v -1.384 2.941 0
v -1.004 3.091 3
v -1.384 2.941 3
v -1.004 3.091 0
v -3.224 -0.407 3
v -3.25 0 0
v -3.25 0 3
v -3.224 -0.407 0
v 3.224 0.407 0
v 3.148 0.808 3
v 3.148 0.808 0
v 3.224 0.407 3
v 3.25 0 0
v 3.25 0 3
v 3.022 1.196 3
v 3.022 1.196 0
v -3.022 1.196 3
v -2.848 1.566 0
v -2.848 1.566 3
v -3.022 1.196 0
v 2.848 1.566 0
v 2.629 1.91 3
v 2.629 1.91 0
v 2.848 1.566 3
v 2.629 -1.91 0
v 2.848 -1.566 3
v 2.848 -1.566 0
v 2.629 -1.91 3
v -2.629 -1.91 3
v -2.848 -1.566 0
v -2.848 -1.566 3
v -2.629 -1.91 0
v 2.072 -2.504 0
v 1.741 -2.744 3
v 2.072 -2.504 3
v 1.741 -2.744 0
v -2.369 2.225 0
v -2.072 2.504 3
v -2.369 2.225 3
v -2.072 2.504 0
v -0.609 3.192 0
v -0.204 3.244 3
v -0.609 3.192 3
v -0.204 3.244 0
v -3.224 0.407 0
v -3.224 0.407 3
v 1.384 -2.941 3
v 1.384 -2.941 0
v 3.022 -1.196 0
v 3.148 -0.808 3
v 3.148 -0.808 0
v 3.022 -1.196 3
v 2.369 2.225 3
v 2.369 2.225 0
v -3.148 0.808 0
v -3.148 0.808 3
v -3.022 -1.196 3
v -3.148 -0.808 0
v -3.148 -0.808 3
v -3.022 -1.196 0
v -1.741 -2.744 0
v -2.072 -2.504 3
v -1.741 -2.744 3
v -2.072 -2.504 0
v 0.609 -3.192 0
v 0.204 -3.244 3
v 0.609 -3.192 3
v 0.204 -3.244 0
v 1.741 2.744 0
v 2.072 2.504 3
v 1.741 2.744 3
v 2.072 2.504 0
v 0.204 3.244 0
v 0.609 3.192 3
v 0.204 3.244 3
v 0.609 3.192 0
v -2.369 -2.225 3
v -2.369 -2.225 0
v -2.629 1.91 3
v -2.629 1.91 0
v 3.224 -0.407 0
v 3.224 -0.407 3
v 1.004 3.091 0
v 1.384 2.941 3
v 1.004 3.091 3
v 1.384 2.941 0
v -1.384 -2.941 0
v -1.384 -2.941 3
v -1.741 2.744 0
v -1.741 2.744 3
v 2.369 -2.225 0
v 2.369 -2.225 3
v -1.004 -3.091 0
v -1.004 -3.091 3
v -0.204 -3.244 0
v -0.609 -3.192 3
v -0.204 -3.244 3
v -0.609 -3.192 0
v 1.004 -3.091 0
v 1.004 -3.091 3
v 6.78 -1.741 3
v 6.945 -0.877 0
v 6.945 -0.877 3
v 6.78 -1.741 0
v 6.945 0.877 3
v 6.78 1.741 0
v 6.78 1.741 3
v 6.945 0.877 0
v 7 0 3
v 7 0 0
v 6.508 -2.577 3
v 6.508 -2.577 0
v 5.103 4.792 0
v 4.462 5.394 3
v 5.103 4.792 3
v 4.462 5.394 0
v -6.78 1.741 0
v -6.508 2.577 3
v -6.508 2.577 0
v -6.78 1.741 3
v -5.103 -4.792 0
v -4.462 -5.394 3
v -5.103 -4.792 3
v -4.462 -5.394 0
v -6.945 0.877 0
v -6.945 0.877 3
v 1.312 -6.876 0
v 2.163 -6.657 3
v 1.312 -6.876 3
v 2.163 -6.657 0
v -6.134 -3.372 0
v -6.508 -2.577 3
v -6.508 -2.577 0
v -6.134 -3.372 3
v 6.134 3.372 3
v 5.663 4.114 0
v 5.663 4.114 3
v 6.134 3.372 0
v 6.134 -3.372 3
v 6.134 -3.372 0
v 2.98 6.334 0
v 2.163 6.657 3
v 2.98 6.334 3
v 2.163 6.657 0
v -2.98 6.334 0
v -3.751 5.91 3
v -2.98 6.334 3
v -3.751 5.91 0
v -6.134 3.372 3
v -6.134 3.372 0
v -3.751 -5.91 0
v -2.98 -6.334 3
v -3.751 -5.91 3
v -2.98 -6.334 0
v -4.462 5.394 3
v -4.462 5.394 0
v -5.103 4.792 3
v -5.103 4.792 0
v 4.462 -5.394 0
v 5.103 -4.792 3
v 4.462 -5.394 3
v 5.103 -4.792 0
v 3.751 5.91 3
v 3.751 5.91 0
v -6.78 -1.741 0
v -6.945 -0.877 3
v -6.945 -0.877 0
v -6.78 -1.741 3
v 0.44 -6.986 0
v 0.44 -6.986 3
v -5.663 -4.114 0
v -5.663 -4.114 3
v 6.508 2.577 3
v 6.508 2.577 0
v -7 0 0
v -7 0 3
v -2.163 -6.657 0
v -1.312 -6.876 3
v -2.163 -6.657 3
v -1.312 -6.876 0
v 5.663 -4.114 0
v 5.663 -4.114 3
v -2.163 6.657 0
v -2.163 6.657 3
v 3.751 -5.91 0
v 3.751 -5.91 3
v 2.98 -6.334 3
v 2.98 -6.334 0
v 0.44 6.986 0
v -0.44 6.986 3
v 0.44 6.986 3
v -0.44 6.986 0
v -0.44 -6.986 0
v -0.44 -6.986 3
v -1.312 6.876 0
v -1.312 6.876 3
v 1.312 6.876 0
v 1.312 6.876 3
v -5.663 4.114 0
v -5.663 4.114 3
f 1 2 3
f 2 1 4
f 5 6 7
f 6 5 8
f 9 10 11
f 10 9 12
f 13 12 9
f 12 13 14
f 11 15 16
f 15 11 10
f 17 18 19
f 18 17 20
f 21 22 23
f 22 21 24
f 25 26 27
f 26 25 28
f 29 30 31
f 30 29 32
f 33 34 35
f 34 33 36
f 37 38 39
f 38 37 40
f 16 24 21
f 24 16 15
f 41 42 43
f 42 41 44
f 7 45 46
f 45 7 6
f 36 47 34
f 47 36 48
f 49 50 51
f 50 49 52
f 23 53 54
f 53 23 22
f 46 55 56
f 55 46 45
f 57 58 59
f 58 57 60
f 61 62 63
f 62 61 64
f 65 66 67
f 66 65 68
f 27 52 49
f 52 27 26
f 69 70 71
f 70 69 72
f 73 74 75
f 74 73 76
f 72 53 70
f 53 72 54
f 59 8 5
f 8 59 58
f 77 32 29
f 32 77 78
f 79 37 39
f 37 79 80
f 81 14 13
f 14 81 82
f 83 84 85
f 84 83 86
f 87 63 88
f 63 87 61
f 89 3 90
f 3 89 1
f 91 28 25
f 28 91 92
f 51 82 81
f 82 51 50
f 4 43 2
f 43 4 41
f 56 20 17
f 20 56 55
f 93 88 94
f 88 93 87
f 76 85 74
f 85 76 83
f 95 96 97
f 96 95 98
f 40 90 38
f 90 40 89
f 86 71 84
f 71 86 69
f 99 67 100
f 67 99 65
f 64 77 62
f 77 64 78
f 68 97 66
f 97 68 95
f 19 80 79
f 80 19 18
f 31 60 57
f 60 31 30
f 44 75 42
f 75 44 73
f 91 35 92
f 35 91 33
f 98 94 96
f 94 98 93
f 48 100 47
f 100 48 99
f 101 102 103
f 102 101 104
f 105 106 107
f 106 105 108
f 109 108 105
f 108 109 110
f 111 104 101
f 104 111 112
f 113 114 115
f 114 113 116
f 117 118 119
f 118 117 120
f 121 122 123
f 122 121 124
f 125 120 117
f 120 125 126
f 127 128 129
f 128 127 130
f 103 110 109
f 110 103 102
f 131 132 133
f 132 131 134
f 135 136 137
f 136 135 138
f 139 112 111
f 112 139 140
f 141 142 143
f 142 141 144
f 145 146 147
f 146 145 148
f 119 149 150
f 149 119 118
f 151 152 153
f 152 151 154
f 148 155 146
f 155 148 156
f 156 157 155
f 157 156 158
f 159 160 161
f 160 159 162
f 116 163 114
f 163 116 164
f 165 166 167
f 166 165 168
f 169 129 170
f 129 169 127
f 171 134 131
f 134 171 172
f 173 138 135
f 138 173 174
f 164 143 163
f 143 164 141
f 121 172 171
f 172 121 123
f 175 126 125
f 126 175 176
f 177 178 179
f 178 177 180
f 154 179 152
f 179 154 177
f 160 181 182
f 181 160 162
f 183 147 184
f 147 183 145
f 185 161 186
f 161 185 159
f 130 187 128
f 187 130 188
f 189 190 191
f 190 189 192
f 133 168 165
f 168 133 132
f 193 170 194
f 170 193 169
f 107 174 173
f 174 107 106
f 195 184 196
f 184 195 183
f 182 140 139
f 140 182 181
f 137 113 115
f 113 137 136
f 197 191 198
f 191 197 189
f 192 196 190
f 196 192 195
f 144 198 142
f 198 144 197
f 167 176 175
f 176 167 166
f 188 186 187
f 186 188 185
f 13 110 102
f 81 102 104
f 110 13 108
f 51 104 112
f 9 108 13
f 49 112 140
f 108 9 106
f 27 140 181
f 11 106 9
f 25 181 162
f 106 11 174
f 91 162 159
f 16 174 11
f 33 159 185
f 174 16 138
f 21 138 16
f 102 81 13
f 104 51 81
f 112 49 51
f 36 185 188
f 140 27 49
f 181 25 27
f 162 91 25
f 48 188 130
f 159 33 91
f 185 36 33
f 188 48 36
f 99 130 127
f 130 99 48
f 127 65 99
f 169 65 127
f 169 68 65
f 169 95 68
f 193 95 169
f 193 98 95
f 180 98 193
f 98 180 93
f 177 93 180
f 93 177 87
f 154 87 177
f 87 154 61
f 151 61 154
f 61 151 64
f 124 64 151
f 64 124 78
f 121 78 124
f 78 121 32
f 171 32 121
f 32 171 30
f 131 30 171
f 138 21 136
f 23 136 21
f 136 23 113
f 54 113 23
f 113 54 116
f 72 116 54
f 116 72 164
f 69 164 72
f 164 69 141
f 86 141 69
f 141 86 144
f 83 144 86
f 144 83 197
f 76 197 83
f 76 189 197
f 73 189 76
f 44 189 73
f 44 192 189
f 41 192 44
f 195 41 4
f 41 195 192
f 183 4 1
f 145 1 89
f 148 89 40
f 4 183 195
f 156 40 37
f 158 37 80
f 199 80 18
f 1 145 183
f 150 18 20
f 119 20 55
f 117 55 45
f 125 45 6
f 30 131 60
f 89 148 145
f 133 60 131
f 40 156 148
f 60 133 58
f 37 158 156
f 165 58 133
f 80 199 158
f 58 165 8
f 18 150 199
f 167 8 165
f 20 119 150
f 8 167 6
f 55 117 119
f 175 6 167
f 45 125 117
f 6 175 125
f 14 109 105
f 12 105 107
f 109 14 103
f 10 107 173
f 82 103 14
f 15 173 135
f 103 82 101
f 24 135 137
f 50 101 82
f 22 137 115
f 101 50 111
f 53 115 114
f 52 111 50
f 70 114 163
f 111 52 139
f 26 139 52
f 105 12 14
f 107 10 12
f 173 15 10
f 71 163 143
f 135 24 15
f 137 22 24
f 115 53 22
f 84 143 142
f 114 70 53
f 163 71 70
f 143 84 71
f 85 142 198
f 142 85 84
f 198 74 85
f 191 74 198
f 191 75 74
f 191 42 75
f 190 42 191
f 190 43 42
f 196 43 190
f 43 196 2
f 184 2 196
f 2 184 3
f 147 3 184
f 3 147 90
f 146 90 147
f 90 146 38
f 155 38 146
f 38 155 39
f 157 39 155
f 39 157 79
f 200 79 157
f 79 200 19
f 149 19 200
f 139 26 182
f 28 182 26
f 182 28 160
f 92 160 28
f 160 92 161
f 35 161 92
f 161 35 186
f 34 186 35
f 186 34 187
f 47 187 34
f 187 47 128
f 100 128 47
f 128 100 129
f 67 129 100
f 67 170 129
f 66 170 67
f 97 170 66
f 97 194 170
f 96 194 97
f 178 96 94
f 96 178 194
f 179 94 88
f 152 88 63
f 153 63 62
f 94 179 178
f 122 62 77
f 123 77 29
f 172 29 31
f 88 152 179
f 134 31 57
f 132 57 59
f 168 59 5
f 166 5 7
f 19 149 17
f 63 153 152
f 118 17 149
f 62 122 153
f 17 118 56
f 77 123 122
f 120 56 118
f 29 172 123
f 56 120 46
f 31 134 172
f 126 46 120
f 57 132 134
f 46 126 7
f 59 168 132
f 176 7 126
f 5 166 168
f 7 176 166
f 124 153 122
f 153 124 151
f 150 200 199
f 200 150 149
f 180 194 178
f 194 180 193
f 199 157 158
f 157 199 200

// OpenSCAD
$fn = 50;

difference() {
	union() {
		cylinder(h = 3, r = 7.0);
	}
	union() {
		translate(v = [0.0, 0.0, -100.0]) {
			cylinder(h = 200, r = 3.25);
		}
		translate(v = [0.0, 0.0, -100.0]) {
			cylinder(h = 200, r = 1.8);
		}
		cylinder(h = 3, r = 3.0);
	}
}
